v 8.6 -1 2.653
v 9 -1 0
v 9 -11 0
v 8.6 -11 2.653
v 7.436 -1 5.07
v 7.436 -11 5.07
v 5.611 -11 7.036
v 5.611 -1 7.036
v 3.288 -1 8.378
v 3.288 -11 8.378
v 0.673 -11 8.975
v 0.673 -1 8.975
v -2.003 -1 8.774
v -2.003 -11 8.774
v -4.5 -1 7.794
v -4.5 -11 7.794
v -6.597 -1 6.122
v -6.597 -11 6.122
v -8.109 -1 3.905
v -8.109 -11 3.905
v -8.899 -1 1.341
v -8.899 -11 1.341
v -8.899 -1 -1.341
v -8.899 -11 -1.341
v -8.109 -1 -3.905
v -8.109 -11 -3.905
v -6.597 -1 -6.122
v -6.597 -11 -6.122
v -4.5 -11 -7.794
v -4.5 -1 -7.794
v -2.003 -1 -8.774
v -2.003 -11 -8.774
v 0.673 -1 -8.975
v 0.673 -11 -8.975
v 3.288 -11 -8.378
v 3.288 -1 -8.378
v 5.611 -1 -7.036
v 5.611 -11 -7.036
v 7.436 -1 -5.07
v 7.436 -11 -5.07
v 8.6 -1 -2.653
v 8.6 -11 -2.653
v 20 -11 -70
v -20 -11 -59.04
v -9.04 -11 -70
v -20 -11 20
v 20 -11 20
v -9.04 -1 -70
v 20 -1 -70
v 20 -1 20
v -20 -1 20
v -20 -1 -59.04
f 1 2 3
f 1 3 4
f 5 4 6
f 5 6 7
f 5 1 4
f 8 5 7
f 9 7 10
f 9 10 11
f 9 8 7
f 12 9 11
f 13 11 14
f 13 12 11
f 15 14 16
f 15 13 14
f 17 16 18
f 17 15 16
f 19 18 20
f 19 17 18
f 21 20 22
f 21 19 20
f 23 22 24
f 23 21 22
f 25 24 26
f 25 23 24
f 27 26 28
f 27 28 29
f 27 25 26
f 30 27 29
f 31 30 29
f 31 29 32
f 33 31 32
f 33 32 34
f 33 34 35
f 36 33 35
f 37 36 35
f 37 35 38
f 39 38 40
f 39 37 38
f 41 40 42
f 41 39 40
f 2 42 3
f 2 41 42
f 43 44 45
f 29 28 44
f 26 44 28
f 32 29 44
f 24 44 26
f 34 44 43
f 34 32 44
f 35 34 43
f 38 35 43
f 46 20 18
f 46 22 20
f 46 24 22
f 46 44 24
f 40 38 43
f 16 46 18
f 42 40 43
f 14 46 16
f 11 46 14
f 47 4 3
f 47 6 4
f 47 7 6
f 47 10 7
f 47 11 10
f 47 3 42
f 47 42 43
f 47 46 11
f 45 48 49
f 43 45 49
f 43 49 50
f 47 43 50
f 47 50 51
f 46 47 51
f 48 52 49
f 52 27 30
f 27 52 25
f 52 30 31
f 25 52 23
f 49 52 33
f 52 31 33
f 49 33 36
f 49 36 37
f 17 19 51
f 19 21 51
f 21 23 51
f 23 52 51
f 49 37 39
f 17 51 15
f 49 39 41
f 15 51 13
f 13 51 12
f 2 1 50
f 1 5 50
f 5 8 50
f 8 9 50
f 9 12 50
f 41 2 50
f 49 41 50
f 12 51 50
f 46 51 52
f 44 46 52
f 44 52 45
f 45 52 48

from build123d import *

# Parameters (mm, degrees)
F1_R     = 9
F2_DEPTH = 10


with BuildPart() as f2:
    # F1 (on offset) → F2 (new body)
    with BuildSketch(Plane.XZ.offset(1)):
        Polygon((20, -70), (20, 20), (-20, 20), (-20, -59.039845), (-9.039845, -70), align=None)
        Circle(F1_R, mode=Mode.SUBTRACT)
    extrude(amount=F2_DEPTH)


solid = f2.part
